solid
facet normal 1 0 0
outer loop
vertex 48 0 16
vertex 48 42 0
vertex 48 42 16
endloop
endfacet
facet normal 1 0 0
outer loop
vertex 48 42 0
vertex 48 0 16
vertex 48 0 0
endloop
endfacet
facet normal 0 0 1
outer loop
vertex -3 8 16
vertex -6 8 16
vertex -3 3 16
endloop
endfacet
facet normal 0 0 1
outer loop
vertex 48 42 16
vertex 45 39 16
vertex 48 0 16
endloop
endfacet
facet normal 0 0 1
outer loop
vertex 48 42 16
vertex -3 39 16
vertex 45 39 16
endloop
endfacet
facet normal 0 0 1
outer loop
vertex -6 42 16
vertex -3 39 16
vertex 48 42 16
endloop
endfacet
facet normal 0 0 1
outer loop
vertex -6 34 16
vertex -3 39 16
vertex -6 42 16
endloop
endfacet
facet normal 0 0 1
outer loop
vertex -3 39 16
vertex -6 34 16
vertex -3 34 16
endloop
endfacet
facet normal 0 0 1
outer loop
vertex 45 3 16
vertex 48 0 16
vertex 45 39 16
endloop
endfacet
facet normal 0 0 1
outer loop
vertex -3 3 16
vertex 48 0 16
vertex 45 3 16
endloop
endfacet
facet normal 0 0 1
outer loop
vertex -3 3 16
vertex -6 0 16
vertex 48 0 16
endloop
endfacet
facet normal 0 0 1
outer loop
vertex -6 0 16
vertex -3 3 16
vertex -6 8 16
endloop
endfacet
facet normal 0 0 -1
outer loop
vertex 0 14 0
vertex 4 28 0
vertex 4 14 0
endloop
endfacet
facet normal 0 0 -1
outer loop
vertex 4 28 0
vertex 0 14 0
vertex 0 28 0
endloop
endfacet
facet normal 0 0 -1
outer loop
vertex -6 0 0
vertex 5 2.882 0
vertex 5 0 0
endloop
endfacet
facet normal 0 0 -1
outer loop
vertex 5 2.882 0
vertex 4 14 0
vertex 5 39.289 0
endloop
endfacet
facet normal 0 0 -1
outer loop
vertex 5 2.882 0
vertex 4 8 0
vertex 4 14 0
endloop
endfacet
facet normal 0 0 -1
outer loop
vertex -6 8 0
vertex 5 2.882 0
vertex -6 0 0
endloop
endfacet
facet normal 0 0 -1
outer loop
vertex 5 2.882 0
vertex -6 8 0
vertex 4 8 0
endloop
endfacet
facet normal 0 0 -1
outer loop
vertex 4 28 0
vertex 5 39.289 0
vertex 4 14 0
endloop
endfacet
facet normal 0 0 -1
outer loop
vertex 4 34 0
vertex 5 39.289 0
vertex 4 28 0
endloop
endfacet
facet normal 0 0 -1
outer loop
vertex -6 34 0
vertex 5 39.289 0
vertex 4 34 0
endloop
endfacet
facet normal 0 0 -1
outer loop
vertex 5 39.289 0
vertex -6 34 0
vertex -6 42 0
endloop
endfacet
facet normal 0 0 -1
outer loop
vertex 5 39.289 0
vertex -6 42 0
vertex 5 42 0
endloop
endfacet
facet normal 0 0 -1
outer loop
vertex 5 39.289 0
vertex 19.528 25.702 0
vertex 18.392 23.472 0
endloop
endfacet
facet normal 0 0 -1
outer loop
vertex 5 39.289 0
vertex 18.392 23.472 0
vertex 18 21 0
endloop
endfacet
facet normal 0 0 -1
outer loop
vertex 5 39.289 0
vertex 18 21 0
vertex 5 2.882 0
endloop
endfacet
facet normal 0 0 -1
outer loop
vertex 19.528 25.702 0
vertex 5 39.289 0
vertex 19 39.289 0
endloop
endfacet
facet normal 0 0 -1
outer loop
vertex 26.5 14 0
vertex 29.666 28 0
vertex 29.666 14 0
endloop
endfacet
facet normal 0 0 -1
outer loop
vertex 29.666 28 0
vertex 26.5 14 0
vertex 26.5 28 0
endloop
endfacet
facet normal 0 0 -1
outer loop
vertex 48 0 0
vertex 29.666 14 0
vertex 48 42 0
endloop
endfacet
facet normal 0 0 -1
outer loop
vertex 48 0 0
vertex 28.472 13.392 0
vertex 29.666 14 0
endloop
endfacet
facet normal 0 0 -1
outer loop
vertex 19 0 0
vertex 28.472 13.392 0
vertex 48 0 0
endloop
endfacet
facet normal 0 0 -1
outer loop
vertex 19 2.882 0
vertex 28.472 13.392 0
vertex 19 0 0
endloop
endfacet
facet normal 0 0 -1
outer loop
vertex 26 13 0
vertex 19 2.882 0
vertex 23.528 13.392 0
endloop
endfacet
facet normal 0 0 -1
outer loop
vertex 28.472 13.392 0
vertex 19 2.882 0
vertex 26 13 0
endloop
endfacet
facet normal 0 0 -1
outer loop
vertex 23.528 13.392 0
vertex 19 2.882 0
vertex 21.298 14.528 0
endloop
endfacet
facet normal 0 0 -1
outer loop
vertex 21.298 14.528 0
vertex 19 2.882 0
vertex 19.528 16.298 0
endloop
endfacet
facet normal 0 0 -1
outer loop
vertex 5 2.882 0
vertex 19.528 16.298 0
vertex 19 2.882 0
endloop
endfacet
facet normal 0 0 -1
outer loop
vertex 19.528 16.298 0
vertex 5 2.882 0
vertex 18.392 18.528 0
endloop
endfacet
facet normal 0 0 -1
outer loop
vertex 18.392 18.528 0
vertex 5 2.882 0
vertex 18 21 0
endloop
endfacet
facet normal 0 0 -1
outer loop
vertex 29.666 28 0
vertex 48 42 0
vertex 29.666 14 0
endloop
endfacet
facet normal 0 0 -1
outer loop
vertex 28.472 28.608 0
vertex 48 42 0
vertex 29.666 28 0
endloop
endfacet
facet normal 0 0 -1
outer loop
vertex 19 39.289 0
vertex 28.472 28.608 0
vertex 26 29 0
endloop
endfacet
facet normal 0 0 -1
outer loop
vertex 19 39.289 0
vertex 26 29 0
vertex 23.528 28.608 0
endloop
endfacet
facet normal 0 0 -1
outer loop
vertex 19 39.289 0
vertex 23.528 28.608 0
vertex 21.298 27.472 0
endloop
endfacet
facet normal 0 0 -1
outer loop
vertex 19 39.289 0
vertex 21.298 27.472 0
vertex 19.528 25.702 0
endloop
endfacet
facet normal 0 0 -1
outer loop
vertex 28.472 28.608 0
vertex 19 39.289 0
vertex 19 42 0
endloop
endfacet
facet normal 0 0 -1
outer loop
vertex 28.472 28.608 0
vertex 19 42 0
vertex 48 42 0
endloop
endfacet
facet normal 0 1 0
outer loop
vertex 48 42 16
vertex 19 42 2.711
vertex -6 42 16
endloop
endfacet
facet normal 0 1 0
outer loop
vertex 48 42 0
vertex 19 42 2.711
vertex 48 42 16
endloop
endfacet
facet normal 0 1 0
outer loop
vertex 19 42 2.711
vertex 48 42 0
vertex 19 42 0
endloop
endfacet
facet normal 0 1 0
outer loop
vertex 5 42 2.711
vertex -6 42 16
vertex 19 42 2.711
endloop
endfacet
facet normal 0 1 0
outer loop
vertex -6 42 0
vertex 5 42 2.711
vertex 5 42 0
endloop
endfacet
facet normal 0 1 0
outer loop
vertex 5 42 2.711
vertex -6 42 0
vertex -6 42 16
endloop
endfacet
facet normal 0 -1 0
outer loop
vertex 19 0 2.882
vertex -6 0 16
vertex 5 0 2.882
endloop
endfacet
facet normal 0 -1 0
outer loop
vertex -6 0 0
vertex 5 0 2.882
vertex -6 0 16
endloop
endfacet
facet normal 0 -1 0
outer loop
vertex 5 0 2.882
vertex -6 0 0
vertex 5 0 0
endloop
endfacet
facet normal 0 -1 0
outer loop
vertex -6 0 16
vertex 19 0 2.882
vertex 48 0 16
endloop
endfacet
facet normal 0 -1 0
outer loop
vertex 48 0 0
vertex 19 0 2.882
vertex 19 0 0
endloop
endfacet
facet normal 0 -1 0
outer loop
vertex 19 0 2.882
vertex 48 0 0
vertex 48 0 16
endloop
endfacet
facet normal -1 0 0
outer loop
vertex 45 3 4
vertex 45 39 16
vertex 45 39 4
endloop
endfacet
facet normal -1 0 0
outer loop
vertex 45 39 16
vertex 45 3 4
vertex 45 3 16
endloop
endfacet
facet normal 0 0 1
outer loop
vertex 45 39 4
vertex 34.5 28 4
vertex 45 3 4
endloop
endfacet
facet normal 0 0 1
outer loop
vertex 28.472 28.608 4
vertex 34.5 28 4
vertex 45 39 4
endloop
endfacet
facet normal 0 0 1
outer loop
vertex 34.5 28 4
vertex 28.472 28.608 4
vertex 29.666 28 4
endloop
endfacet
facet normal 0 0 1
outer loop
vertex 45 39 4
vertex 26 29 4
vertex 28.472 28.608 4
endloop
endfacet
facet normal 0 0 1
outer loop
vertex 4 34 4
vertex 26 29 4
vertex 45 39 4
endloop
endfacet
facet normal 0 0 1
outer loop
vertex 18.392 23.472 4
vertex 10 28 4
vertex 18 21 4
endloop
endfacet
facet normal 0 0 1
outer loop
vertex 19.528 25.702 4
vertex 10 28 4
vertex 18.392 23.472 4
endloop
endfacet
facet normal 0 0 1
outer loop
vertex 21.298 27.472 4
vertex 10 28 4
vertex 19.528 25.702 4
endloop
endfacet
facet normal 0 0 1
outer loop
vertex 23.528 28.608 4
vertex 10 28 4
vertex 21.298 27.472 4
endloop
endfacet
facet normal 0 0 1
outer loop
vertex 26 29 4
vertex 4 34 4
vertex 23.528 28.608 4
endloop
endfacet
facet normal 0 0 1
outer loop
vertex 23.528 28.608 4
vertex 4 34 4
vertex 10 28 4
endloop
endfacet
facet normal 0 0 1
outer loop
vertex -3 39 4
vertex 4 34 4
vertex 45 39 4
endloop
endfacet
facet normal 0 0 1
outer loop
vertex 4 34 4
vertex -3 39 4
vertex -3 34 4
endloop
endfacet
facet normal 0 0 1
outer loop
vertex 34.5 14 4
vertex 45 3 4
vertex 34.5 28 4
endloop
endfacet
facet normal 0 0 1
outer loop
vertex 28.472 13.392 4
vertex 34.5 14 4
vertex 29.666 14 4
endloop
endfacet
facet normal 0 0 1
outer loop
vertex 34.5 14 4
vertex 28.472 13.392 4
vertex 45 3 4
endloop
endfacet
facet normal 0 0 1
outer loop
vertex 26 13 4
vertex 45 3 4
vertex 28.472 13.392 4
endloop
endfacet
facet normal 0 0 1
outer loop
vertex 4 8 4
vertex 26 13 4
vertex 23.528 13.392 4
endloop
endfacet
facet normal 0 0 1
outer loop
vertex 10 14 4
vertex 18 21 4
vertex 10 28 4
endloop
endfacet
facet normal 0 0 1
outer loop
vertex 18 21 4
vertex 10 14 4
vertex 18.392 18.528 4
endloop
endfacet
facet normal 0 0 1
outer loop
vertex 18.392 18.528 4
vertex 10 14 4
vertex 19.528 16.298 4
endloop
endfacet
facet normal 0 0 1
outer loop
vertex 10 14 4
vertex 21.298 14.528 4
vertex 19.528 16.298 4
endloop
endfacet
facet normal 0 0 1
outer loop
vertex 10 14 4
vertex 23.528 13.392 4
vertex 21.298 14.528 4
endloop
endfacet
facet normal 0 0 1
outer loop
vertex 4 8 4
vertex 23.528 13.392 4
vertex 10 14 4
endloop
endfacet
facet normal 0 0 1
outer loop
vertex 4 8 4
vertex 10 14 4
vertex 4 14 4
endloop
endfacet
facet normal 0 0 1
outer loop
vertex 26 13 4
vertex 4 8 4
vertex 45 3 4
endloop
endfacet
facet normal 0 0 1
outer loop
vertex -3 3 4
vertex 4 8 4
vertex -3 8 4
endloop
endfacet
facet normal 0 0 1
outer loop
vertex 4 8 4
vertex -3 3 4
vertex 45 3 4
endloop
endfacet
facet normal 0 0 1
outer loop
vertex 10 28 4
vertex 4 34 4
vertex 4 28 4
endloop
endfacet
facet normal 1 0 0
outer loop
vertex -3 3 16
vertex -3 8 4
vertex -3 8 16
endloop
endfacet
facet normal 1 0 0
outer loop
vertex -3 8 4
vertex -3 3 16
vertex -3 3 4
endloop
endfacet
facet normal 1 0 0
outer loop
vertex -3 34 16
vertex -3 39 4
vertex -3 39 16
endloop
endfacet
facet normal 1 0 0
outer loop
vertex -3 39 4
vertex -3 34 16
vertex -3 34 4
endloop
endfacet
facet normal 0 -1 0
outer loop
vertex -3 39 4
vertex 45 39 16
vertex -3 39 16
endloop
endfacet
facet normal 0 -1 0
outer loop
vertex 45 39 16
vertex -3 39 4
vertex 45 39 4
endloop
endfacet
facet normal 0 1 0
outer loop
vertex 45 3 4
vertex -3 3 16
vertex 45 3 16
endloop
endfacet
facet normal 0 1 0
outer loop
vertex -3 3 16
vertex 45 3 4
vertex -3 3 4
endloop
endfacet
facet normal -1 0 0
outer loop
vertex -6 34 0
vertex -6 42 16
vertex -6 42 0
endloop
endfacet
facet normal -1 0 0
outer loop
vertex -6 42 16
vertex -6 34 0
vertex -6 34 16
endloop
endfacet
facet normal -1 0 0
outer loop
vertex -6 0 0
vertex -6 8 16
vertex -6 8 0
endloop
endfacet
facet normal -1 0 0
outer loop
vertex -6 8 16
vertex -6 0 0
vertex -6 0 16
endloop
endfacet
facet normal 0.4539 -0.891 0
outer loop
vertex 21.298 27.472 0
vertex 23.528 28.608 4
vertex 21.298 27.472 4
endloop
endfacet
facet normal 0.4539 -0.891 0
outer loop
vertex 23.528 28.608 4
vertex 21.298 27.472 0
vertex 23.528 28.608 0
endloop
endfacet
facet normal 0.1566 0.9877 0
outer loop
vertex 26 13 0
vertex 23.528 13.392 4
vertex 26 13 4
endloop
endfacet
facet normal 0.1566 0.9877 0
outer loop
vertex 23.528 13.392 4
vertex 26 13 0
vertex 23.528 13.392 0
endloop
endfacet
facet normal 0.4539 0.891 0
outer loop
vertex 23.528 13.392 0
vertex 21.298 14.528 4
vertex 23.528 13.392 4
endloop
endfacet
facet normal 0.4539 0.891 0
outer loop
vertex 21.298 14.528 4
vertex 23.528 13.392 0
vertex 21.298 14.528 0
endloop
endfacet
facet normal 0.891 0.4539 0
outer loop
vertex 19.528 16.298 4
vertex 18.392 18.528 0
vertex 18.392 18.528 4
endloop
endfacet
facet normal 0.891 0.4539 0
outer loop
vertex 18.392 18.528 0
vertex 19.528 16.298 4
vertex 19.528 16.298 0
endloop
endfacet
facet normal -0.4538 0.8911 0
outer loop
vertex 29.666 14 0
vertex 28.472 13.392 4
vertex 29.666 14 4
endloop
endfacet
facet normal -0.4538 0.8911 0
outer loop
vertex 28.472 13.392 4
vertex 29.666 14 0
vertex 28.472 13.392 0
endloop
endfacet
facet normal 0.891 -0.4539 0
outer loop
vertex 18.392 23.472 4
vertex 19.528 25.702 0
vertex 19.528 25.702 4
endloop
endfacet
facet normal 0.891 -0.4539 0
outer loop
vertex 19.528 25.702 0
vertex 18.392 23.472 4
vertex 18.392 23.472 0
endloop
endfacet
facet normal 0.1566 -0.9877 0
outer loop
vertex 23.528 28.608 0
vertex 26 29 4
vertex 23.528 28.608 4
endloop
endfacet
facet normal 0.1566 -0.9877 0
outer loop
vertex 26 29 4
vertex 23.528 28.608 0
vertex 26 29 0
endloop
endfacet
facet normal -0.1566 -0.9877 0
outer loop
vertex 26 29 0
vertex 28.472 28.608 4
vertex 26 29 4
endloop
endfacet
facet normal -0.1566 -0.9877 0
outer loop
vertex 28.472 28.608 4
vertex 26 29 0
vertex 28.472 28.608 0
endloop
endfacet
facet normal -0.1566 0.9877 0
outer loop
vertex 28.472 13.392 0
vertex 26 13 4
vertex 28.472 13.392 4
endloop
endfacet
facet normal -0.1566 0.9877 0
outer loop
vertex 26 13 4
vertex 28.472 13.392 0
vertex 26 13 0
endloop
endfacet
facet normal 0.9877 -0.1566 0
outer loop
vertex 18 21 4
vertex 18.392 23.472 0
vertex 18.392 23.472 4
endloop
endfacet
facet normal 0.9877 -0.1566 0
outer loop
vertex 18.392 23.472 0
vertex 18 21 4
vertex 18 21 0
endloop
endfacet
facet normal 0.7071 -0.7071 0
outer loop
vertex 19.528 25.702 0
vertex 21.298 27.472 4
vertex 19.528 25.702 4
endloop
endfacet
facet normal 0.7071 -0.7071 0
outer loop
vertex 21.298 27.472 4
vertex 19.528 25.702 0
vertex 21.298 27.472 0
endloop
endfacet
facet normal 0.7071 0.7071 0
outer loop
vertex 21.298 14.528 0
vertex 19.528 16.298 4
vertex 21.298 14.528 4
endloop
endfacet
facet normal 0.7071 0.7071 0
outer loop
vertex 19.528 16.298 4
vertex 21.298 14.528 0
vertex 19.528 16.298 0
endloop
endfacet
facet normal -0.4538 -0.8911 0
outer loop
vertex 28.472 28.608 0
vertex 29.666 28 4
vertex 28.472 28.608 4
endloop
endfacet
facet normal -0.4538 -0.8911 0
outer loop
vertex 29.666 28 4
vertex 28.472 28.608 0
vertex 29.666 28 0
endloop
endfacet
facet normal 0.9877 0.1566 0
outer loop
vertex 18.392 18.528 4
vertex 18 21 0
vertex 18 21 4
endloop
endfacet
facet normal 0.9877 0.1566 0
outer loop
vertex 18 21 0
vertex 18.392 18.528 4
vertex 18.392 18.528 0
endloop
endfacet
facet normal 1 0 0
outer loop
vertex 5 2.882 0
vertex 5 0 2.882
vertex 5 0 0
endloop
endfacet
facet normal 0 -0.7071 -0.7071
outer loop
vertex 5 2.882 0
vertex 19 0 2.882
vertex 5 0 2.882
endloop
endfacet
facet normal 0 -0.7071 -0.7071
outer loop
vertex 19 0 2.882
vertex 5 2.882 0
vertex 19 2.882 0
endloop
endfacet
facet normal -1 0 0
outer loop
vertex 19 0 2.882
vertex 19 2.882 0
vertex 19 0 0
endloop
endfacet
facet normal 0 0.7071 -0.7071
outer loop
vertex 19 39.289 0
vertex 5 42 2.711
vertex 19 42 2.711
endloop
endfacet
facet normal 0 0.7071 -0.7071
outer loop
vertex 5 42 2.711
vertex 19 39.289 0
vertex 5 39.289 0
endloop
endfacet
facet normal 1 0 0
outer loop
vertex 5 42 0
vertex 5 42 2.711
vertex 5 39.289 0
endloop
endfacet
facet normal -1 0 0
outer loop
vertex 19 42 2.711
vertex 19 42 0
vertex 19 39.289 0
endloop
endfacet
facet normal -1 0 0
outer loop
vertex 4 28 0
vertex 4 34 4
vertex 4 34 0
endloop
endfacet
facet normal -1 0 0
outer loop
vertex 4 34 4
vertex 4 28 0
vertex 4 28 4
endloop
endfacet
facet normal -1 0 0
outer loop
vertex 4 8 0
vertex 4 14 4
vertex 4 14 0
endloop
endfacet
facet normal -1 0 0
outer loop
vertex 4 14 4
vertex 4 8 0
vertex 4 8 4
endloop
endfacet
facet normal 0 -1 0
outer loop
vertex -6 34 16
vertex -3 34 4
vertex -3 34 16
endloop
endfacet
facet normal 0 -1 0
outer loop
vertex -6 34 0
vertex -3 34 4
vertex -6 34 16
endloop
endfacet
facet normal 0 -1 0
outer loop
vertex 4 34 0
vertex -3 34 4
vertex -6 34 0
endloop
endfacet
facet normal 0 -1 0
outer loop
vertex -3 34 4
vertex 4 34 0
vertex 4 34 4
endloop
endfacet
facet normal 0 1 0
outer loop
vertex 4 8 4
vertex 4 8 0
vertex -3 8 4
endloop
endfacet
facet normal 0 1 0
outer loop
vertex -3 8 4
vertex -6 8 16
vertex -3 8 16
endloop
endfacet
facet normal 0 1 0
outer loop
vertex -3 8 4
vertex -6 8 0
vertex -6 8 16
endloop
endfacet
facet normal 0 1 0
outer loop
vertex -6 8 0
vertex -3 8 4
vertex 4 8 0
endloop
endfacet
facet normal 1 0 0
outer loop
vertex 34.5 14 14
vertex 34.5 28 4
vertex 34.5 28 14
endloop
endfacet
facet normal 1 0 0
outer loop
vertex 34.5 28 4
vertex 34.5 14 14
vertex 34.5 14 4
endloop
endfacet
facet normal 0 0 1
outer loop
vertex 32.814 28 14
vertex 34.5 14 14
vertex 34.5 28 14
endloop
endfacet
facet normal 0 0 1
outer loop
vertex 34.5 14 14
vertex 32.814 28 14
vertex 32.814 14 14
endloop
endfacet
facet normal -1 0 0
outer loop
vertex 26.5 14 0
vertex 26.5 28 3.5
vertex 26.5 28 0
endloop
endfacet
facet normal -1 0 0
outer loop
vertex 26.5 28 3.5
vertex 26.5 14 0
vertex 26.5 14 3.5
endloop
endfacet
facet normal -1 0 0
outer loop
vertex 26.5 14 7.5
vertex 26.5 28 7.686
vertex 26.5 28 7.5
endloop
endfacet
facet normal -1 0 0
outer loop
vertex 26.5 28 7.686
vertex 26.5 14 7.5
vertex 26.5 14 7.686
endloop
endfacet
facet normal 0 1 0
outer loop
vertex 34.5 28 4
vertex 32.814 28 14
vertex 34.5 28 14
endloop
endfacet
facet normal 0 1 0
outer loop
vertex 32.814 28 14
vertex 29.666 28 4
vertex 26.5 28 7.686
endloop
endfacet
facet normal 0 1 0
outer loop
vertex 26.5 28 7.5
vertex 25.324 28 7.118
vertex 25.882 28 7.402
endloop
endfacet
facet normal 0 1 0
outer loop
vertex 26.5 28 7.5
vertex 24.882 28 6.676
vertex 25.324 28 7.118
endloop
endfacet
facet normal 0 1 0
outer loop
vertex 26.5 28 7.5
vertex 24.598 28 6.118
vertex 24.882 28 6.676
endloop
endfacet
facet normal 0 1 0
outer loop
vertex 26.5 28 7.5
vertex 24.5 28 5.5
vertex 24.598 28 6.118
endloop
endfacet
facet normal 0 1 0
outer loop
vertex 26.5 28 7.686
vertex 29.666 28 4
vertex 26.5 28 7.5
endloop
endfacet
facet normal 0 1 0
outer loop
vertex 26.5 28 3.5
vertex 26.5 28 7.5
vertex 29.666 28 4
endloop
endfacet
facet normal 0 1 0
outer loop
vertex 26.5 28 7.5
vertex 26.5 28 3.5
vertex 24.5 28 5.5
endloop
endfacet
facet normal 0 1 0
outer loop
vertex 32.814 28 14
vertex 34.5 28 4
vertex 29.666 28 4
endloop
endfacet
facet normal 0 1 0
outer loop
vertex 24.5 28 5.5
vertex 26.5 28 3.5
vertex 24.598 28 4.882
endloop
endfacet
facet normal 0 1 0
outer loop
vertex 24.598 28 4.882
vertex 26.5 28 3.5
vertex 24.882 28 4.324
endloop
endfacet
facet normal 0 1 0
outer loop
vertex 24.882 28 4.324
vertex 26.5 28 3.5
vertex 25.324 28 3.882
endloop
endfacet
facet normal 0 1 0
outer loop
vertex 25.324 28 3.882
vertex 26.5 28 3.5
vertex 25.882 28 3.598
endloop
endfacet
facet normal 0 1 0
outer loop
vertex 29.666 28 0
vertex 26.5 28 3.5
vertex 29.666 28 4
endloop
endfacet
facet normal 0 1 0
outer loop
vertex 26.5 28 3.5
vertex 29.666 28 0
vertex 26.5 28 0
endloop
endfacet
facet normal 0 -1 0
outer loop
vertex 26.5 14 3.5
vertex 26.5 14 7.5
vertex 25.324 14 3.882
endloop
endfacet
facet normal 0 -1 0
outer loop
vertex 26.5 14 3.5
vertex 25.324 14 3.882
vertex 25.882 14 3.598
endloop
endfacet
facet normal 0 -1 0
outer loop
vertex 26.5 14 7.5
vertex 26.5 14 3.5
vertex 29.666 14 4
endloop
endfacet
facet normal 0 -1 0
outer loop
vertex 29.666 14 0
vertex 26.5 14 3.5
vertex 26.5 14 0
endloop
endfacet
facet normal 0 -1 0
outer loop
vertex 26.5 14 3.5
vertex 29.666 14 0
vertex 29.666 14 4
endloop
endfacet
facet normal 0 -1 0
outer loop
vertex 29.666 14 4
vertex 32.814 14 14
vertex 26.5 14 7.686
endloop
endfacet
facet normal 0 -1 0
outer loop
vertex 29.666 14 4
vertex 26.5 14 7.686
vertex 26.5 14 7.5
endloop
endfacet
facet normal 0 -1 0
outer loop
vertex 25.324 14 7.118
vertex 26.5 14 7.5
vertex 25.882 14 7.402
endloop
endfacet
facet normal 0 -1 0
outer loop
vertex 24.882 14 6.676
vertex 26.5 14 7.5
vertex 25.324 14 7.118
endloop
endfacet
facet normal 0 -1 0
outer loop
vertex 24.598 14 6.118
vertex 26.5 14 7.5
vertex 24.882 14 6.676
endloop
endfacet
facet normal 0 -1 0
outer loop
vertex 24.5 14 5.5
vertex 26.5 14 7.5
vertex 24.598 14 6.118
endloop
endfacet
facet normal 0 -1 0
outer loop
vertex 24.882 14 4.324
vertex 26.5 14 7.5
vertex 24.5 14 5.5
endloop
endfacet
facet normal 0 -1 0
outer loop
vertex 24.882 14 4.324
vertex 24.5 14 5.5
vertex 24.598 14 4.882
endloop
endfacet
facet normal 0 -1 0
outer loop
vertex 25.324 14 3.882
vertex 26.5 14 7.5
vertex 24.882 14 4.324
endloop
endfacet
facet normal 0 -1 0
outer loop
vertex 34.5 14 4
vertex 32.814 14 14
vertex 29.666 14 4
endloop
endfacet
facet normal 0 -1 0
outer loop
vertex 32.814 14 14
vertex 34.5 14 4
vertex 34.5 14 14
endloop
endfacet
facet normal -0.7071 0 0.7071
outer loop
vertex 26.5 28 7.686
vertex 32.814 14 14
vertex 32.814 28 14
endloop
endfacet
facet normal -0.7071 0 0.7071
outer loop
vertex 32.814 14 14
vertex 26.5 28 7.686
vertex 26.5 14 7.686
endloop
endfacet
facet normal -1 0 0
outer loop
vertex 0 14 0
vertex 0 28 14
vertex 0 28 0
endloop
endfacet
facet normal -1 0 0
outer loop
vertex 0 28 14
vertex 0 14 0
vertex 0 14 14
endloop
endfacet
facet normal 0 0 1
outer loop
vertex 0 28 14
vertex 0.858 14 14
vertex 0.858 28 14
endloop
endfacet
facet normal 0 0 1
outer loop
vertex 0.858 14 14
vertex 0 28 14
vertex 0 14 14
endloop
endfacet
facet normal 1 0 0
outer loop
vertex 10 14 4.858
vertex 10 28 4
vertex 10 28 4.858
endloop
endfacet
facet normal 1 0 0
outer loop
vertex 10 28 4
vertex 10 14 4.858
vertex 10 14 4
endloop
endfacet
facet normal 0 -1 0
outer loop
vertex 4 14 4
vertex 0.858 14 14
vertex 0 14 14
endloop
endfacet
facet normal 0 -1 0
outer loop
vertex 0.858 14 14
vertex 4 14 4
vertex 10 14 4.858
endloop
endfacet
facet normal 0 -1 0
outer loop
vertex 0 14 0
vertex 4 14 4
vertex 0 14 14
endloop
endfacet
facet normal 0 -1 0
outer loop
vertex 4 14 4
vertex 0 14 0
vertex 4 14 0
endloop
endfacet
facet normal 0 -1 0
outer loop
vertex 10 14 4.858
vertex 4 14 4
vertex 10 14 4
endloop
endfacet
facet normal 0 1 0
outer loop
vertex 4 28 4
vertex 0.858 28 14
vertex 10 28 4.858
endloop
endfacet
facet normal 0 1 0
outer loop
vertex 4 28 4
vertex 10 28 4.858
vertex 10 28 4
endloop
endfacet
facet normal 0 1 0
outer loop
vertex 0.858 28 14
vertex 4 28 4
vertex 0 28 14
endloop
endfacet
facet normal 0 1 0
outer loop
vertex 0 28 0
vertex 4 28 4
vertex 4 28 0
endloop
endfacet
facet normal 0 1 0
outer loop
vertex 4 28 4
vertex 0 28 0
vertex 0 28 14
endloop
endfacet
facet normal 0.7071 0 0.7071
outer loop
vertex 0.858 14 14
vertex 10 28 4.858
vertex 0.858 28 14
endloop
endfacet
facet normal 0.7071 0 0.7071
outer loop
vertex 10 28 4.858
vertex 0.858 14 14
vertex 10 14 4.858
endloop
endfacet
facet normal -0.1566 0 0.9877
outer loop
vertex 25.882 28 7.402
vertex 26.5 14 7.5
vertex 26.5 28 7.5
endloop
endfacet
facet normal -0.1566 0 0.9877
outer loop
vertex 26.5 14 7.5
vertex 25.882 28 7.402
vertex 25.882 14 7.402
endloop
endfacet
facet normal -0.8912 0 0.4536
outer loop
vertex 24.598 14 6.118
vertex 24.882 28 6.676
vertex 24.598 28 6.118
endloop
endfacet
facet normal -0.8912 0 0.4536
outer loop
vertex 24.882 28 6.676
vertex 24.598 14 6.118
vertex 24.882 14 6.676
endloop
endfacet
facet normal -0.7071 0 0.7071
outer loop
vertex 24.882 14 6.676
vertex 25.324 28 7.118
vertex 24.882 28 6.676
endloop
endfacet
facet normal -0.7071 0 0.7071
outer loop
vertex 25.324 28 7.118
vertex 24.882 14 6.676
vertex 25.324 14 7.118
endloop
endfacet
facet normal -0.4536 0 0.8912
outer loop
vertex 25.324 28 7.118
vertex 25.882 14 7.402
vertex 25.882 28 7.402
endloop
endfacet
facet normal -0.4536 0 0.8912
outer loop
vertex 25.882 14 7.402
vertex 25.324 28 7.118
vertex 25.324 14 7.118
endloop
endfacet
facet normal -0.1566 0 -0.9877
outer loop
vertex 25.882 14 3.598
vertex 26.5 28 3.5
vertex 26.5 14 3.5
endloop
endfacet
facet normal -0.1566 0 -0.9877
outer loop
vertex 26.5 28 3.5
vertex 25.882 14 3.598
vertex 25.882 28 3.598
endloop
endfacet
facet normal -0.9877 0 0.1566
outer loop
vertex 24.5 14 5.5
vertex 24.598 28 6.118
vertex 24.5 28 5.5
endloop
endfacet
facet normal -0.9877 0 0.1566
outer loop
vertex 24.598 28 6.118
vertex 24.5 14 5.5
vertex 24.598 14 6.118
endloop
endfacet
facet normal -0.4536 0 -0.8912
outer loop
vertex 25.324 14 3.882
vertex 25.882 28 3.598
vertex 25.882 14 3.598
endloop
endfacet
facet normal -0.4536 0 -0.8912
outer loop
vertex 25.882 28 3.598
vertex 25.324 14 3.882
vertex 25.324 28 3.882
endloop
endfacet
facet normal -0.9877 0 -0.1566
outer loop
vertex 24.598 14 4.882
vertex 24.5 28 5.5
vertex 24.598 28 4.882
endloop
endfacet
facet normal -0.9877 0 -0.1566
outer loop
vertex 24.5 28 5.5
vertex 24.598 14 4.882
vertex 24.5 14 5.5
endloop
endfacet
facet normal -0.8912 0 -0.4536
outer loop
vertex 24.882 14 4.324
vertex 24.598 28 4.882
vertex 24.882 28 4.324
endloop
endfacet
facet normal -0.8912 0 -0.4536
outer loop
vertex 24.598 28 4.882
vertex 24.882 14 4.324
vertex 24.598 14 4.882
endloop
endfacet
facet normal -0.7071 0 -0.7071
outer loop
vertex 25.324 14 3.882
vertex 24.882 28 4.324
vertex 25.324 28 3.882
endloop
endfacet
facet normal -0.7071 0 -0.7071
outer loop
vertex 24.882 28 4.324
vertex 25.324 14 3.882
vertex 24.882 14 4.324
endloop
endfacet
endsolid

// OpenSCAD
$fn=20;

gDepth = -1;



union(){
translate([26.5,28,5.5]){// just a bump
rotate([90,0,0]){
    cylinder(14,r=2);
}}
difference(){
rotate([0,0,0]){
translate([-12,0,0]){
cube([60,42,16]);  // Cap
}}
translate([-3,3,4]){
cube([48,36,50]);  // gut it.
}
translate([-20,-3,-4]){
cube([14,48,50]);  // trim it.
}


translate([26,21,-10]){ // barrel hole
rotate([0,0,0]){
    cylinder(50,r=8,8);
}}

translate([5,-15,-50]){ // zip path 1
rotate([45,0,0]){
cube([14,48,50]);
}}
translate([5,60,-50]){ // zip path 2
rotate([45,0,0]){
cube([14,48,50]);
}}

translate([-14,8,-5]){ // handle space
cube([18,26,32]);
}

}

translate([0.5,0,0]){  // move this.
difference(){
translate([26,14,0]){ // ramp
    cube([8,14,14]);
}
translate([12,9,5]){
rotate([0,45,0]){
    cube([8,24,26]);
}}
}}

translate([36,42,0]){  // move this.
rotate([0,0,180]){
difference(){
translate([26,14,0]){ // ramp 2
    cube([10,14,14]);
}
translate([12,9,5]){
rotate([0,45,0]){
    cube([10,28,26]);
}}
}}}

}
